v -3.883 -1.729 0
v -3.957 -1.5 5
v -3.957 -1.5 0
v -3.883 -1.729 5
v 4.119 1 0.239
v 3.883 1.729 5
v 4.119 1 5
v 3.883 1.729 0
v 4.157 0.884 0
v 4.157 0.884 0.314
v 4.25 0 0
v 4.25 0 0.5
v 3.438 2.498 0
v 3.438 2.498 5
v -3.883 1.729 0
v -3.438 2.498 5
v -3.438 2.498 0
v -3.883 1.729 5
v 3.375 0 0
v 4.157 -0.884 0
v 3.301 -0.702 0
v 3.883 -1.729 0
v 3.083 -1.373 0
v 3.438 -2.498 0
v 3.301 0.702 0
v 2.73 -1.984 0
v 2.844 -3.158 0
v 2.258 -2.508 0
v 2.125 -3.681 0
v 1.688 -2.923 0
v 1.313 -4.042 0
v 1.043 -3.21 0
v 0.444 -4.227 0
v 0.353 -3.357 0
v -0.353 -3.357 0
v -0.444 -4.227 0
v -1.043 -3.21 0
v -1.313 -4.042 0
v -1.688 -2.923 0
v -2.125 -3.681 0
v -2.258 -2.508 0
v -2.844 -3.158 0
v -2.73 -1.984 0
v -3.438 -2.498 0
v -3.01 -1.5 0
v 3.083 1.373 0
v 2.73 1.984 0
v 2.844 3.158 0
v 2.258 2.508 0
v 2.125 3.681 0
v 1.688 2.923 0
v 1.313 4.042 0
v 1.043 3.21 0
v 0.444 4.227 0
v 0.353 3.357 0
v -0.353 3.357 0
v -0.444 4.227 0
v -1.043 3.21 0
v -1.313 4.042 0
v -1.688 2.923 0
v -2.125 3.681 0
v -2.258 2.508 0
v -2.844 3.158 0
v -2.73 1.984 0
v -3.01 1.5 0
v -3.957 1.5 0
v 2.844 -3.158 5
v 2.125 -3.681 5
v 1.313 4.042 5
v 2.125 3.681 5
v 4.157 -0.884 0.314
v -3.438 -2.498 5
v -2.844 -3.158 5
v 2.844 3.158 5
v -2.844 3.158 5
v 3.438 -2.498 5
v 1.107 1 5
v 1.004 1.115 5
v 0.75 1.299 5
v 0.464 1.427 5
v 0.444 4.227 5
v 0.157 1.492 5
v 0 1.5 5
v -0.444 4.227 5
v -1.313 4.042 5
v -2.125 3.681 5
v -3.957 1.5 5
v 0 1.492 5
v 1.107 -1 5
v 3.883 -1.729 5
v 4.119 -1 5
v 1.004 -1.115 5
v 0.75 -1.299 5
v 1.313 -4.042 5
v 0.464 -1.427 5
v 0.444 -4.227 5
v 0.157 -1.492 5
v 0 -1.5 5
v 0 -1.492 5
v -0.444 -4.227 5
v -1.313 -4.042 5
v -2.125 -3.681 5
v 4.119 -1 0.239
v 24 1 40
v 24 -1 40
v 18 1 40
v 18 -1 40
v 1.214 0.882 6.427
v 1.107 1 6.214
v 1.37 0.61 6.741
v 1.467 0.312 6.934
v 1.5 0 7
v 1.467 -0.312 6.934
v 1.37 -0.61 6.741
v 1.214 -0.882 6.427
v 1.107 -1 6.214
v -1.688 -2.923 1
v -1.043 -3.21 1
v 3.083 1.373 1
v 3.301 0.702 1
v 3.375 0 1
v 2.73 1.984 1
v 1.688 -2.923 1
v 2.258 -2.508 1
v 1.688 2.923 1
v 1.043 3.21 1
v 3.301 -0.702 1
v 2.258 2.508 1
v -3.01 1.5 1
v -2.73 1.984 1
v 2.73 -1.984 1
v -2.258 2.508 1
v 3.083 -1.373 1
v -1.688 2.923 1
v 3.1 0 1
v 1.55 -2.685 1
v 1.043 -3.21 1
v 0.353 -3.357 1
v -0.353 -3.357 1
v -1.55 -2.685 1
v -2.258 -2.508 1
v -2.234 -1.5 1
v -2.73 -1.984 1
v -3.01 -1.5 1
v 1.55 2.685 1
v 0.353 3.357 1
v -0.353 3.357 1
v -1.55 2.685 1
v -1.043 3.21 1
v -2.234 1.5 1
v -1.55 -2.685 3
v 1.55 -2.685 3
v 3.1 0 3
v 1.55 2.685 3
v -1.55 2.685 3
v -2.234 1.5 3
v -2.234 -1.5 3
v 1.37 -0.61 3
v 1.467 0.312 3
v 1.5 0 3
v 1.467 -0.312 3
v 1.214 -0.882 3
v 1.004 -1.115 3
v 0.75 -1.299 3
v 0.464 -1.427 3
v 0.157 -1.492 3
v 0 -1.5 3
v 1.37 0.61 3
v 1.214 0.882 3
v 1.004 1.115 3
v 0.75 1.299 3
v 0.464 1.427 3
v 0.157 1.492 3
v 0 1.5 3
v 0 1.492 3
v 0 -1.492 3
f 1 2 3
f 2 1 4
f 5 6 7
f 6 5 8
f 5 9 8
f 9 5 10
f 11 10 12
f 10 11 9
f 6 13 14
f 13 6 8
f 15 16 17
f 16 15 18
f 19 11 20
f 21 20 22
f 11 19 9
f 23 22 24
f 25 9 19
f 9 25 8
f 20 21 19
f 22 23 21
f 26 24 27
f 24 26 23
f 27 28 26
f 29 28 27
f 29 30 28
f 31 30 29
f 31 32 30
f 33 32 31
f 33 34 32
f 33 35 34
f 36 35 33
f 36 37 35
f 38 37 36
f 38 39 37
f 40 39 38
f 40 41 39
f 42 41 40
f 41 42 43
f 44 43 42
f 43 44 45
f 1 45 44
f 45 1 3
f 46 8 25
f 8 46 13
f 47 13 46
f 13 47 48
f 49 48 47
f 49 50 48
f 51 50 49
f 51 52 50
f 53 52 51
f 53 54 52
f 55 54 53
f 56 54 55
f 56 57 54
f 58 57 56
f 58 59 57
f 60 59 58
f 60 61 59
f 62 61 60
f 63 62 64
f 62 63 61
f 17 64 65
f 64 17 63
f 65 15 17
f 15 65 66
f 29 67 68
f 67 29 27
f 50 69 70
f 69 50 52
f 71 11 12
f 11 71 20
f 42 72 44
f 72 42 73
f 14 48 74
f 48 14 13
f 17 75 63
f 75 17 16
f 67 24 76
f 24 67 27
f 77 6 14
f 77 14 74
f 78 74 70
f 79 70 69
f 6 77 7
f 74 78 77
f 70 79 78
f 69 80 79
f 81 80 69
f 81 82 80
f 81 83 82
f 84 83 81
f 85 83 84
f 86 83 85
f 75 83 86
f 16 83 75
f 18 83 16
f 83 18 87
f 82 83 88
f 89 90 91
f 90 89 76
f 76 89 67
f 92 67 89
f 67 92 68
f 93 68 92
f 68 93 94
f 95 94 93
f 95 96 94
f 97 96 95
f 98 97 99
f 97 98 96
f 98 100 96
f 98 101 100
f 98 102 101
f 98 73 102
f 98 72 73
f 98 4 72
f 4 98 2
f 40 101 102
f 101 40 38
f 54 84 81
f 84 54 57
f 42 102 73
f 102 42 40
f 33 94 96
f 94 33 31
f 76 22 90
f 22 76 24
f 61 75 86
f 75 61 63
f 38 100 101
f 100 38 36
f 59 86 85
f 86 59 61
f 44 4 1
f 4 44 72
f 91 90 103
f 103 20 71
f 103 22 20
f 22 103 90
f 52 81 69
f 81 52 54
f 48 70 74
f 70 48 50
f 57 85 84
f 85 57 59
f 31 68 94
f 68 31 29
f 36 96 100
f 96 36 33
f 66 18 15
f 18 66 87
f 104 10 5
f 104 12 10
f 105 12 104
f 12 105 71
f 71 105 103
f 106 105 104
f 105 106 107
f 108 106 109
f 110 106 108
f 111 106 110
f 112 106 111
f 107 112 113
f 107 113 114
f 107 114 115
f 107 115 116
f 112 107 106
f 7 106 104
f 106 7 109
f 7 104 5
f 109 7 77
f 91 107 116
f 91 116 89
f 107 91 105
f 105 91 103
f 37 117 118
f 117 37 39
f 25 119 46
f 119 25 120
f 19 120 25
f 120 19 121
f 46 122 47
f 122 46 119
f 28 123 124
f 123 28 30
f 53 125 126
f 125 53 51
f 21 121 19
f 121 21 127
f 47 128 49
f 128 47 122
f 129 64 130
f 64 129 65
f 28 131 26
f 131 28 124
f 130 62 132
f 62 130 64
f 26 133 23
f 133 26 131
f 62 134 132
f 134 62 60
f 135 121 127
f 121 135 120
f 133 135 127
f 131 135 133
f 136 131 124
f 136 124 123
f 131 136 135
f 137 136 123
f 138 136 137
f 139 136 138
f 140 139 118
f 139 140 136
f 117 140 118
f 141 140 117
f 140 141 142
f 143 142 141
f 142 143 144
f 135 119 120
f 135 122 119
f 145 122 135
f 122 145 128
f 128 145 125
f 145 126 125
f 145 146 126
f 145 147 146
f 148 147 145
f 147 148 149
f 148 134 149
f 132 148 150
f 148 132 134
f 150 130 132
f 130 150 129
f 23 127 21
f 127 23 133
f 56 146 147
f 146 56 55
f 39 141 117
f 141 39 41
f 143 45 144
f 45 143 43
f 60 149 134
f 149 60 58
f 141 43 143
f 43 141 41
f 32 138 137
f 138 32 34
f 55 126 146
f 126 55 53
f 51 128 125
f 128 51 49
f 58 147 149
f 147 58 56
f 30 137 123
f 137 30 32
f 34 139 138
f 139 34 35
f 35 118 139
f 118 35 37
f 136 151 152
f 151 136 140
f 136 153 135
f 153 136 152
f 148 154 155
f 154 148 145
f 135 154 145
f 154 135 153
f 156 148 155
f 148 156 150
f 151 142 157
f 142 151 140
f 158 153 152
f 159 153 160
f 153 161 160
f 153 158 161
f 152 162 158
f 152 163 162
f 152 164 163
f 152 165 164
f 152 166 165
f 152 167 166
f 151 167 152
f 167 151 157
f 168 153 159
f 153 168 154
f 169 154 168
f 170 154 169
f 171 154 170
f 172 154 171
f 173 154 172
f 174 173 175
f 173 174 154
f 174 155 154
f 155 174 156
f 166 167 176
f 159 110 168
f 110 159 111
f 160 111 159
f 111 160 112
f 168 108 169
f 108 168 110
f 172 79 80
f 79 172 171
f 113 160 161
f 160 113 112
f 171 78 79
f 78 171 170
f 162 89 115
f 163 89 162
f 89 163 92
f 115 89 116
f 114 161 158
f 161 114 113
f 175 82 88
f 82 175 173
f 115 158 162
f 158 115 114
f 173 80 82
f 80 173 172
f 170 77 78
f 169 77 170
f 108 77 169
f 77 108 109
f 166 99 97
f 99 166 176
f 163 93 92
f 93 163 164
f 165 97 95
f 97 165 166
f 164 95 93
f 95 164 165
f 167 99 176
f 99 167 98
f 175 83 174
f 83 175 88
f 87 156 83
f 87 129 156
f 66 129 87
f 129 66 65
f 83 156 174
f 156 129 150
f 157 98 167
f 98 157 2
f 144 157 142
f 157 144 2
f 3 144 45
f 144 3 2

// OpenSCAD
handle = "slant";
hole = true;
gap = true;

difference() {
    union() {
        cylinder(r=8.5/2, h=5, $fn=30);
        if (handle == "flat")
            flat_handle();
        else if (handle == "side")
            side_handle();
        else if (handle == "slant")
            slant_handle();
        else if (handle == "crook")
            crook_handle();
    }
    cylinder(r=6.75/2, h=2*1, center=true, $fn=30);
    cylinder(r=6.2/2, h=2*3, center=true, $fn=6);

    if (hole || gap)
        cylinder(r=3/2, h=2*10, center=true, $fn=30);

    if (gap)
        translate([-8,-3/2,-2]) cube(size=[8,3,10]);
}

module flat_handle() {
    translate([20,0,3]) cube(size=[40,2,4], center=true);
}

module side_handle() {
    translate([10,0,2.5]) cube(size=[20,2,4], center=true);
    multmatrix([[1, 0, 0.5, 0], [0, 1, 0, 0], [0, 0, 1, 0], [0, 0, 0, 1]])
        translate([17,0,20.5]) cube(size=[6,2,40], center=true);
}

module slant_handle() {
    // Slanting 40mm handle.
    multmatrix([[1, 0, 0.5, 0], [0, 1, 0, 0], [0, 0, 1, 0], [0, 0, 0, 1]])
        translate([1,0,20]) cube(size=[6,2,40], center=true);
}

module crook_handle() {
    // Slanting 20mm handle then 40mm vertical.
    multmatrix([[1, 0, 0.5, 0], [0, 1, 0, 0], [0, 0, 1, 0], [0, 0, 0, 1]])
        translate([1,0,10]) cube(size=[6,2,20], center=true);
    translate([11,0,40]) cube(size=[6,2,40], center=true);
}

//difference() {
//cylinder(r=60, h=60);
//translate([0,0,-0.5]) cylinder(r=59, h=61);
//};

//#translate([0,0,3]) cylinder(r=61, h=30);
//#translate([0,0,43]) cylinder(r=61, h=30);
